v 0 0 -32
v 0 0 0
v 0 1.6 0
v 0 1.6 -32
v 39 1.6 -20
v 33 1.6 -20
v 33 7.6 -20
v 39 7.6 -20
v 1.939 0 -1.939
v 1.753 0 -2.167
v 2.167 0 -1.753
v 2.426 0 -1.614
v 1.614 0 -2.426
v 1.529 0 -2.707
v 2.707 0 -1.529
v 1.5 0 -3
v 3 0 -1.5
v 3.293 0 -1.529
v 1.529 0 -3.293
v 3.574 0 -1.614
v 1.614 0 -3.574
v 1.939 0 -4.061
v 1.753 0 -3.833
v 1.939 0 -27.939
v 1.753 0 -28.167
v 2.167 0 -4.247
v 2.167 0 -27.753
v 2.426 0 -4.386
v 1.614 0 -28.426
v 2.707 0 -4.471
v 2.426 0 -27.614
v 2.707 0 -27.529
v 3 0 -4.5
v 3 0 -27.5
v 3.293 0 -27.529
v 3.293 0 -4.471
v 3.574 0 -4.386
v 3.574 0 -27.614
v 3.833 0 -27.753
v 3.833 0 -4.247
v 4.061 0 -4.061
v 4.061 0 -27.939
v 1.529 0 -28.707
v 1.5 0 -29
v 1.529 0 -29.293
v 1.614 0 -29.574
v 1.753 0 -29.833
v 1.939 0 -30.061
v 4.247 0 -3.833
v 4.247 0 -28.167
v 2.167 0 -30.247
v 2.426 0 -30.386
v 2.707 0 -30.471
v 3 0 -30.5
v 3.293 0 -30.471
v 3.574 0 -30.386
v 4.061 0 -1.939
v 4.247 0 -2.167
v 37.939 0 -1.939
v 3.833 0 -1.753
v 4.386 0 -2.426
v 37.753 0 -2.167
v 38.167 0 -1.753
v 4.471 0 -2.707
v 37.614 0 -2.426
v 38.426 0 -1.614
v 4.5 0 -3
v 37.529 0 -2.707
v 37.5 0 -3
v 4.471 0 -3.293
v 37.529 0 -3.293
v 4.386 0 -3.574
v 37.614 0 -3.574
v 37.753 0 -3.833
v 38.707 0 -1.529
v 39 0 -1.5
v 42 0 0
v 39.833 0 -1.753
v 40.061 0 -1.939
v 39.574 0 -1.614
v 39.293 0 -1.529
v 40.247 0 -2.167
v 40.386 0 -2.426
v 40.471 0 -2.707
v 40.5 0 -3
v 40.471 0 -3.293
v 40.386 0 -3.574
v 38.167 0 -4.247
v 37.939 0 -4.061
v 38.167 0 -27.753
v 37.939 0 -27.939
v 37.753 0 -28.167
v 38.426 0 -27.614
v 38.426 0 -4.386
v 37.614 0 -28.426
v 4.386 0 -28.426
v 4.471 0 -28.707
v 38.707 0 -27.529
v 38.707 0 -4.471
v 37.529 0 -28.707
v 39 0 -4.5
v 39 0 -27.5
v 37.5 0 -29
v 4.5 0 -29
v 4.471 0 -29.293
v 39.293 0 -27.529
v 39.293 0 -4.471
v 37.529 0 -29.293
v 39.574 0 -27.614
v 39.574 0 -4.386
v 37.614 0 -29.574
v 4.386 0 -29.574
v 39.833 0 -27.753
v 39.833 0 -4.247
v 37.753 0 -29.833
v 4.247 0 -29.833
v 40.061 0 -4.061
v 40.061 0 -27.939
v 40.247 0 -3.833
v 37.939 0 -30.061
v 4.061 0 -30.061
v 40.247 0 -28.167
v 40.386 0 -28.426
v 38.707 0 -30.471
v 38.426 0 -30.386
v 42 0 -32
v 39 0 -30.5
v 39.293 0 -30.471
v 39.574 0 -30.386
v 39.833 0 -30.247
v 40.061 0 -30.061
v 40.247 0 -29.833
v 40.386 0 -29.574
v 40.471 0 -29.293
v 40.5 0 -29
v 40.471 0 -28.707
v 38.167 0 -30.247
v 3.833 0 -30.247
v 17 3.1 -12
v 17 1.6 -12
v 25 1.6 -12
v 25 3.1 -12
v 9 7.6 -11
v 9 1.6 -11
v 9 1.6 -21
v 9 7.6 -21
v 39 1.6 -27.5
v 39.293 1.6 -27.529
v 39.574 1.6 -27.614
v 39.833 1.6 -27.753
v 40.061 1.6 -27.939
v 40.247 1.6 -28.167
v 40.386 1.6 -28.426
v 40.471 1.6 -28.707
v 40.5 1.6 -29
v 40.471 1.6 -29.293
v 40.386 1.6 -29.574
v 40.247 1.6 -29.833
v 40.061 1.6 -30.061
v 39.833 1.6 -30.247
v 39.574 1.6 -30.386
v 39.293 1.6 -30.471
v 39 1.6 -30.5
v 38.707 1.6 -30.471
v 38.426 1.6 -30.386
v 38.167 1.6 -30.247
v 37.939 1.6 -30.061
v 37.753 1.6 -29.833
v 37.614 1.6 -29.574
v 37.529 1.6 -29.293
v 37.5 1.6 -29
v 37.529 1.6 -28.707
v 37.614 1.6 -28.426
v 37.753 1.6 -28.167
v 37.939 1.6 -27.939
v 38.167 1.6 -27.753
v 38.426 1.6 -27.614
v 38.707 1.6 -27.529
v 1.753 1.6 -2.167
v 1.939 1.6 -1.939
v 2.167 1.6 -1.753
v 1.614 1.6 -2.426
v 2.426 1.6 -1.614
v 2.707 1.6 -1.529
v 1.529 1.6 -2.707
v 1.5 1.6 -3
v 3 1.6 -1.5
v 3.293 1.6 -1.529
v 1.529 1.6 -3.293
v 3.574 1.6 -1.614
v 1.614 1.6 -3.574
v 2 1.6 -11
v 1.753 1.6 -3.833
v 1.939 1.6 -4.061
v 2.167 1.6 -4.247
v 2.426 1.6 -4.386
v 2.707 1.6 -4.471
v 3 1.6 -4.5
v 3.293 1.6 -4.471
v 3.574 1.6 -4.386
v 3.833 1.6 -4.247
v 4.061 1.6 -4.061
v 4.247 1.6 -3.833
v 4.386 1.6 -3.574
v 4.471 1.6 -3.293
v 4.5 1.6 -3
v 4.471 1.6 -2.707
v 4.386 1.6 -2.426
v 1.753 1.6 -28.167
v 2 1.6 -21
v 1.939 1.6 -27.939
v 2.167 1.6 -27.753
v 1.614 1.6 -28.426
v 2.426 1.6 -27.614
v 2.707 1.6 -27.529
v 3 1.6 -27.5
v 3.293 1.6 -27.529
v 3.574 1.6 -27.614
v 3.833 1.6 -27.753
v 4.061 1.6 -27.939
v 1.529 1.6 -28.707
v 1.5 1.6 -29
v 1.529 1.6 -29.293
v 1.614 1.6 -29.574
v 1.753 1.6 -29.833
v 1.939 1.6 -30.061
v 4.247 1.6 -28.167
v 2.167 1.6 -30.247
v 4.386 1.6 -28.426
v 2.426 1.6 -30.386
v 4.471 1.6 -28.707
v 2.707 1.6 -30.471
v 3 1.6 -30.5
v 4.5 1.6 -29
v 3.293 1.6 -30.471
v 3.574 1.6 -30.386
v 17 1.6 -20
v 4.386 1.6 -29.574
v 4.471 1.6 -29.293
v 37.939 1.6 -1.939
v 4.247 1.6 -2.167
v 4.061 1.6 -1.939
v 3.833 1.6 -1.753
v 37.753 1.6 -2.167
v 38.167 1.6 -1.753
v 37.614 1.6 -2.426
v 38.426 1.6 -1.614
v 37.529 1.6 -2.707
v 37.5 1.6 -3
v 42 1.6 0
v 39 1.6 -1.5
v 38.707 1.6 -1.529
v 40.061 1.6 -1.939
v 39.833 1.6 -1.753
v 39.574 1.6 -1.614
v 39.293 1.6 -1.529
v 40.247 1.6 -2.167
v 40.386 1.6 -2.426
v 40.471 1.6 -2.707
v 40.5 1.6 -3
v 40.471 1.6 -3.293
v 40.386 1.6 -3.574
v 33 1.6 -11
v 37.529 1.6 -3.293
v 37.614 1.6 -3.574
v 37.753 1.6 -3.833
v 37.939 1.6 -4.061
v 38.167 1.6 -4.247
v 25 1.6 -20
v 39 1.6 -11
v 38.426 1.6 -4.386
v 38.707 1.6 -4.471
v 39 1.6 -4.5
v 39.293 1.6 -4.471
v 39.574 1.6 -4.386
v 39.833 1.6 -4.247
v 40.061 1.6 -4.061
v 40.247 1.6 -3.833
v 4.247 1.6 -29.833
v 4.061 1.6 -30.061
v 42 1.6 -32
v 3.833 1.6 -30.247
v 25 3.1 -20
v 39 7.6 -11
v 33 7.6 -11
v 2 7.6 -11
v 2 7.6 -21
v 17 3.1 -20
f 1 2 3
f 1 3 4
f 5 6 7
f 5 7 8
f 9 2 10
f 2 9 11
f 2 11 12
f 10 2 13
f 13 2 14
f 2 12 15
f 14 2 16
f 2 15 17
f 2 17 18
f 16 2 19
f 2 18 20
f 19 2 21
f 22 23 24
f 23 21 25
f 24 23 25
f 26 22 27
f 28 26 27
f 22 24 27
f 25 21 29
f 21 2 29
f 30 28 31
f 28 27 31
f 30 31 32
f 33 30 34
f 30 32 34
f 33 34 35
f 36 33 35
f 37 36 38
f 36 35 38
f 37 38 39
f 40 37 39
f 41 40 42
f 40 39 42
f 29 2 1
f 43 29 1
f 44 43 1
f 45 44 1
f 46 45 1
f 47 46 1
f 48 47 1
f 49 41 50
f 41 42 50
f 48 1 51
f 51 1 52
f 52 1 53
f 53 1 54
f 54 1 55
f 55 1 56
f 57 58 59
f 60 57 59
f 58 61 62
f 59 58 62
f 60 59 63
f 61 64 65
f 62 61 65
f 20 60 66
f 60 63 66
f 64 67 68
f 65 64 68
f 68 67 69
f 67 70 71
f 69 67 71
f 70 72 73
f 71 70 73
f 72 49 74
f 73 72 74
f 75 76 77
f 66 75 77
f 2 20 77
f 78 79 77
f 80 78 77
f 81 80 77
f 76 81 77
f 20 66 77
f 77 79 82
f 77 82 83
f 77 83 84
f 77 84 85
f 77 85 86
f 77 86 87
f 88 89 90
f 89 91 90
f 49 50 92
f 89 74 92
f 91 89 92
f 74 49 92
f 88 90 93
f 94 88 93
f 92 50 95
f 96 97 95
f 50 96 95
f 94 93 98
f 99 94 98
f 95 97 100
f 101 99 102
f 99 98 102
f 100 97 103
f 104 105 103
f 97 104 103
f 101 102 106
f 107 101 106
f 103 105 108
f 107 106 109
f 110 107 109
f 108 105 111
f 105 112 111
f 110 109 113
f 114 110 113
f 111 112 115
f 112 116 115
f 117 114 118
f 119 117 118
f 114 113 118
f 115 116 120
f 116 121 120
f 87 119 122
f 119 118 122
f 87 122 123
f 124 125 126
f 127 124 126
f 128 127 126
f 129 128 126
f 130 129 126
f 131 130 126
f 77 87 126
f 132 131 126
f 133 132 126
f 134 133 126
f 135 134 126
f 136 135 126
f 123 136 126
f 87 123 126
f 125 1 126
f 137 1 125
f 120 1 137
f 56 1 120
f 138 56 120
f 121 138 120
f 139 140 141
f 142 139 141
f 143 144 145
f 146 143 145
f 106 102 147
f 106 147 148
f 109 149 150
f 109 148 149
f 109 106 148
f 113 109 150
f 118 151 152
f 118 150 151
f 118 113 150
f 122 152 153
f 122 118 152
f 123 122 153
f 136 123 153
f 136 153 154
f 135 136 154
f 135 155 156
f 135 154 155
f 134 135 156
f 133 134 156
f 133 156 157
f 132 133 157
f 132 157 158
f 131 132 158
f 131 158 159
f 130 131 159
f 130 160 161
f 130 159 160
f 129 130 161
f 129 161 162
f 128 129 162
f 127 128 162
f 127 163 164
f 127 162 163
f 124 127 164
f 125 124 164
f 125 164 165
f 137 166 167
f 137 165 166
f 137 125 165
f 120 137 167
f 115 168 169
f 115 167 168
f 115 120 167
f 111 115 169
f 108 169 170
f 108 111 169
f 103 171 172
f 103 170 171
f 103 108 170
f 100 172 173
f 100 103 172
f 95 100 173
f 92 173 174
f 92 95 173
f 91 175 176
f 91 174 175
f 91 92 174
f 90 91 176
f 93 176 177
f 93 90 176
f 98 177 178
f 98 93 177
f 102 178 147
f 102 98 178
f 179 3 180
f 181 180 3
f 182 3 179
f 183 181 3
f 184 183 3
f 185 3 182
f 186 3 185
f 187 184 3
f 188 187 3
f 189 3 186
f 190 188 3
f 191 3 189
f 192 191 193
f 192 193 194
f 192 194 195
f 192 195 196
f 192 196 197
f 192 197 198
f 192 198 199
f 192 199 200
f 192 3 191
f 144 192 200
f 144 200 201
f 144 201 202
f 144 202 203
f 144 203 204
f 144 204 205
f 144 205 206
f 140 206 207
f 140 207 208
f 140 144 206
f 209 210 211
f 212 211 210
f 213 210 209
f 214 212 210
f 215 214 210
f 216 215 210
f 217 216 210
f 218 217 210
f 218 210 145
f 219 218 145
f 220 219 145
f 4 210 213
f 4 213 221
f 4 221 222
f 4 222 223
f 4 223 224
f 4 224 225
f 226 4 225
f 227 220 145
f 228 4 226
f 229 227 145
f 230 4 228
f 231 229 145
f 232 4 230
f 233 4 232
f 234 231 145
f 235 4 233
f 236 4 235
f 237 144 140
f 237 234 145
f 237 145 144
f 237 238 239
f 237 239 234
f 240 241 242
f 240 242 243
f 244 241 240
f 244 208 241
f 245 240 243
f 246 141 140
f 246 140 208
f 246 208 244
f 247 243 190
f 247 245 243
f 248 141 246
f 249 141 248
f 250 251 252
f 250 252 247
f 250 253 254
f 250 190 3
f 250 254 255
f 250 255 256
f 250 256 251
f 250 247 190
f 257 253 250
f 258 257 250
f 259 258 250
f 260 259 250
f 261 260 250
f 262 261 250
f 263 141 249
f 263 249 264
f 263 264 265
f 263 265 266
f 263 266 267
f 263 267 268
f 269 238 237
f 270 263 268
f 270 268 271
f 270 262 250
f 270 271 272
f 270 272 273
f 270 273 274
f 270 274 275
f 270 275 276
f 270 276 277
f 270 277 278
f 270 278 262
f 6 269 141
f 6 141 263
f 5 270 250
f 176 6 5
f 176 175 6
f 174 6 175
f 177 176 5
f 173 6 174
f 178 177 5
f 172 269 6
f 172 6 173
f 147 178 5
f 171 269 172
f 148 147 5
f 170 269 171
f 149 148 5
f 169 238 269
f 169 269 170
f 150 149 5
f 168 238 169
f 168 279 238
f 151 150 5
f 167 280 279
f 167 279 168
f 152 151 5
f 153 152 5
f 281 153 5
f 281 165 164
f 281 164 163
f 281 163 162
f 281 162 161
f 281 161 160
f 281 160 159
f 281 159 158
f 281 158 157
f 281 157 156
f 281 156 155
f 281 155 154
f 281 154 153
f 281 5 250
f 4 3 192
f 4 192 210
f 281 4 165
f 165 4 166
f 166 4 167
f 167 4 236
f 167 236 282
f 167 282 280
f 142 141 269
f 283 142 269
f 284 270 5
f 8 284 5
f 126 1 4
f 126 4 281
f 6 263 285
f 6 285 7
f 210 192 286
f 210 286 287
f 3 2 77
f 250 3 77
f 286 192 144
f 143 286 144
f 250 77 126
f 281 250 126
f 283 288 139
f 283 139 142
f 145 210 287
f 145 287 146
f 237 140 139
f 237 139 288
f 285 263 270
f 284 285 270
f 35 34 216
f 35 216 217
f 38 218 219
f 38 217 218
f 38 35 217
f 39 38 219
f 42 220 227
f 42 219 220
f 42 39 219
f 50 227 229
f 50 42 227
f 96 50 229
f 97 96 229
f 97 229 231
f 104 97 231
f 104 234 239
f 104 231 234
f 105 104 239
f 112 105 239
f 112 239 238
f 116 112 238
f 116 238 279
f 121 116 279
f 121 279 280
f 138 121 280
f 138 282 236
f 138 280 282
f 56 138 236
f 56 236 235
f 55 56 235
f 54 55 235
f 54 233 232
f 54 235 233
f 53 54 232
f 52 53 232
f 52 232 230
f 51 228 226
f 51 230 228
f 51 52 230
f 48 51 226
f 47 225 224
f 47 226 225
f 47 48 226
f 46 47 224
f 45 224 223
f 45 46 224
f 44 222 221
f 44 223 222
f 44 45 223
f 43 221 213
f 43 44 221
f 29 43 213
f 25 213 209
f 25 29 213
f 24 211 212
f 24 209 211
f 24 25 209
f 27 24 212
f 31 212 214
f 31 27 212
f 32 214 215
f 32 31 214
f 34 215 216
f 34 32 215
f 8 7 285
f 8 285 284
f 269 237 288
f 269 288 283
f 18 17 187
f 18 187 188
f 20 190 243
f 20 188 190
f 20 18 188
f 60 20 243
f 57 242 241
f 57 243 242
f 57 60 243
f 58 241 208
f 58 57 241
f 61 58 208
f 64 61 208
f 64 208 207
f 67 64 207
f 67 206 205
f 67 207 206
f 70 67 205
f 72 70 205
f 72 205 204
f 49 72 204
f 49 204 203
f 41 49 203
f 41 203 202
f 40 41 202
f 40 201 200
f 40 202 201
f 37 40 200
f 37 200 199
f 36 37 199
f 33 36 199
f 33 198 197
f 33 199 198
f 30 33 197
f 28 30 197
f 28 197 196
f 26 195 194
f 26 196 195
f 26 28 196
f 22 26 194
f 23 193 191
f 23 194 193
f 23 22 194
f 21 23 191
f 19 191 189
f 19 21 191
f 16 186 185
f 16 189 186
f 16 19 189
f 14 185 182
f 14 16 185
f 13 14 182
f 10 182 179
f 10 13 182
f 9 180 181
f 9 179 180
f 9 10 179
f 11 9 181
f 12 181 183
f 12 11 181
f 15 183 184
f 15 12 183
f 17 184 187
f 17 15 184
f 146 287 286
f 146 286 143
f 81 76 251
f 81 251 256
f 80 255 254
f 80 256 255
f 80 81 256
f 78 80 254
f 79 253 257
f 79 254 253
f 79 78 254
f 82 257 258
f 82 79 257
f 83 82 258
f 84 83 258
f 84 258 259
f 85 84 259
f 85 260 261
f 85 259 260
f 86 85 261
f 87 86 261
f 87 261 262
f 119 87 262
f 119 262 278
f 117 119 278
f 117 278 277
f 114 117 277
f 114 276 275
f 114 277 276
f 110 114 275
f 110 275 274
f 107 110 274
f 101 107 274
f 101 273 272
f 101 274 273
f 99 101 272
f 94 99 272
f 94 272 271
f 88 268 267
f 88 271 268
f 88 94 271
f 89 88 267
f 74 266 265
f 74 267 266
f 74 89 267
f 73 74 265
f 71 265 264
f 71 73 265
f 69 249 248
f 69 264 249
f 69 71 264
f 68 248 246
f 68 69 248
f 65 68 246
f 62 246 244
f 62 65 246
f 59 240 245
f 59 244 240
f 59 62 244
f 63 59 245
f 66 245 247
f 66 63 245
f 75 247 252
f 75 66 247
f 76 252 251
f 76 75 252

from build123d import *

# Parameters (mm, degrees)
SKETCH1_W                 = 42
SKETCH1_H                 = 32
PCB_DEPTH                 = 1.6
MOUNT_HOLE_1_DEPTH        = 53.825751296
MOUNT_HOLE_1_DEPTH_BACK   = 53.825751296
SKETCH2_R                 = 1.5
MOUNT_HOLE_2_DEPTH        = 53.825751296
MOUNT_HOLE_2_DEPTH_BACK   = 53.825751296
SKETCH3_R                 = 1.5
MOUNT_HOLE_3_DEPTH        = 53.825751296
MOUNT_HOLE_3_DEPTH_BACK   = 53.825751296
SKETCH4_R                 = 1.5
MOUNT_HOLE_4_DEPTH        = 53.825751296
MOUNT_HOLE_4_DEPTH_BACK   = 53.825751296
SKETCH5_R                 = 1.5
PROBE_CONNECTOR_XH_START  = 1.6
SKETCH6_W                 = 7
SKETCH6_H                 = 10
PROBE_CONNECTOR_XH_DEPTH  = 6
SIGNAL_CONNECTOR_PH_START = 1.6
SKETCH7_W                 = 6
SKETCH7_H                 = 9
SIGNAL_CONNECTOR_PH_DEPTH = 6
SIGNAL_IC_START           = 1.6
SKETCH8_W                 = 8
SKETCH8_H                 = 8
SIGNAL_IC_DEPTH           = 1.5


with BuildPart() as part:
    # Sketch1 → PCB (new body)
    with BuildSketch(Plane(origin=(0, 0, 0), x_dir=(1, 0, 0), z_dir=(0, 1, 0))):
        with Locations((21, 16)):
            Rectangle(SKETCH1_W, SKETCH1_H)
    extrude(amount=PCB_DEPTH)

    # Sketch2 → Mount_hole_1 (cut, two sides: drawn at the far end of the back side and taken through both)
    with BuildSketch(Plane(origin=(0, 0, 0), x_dir=(1, 0, 0), z_dir=(0, 1, 0)).offset(-MOUNT_HOLE_1_DEPTH_BACK)):
        with Locations(Location((3, 3, 0), (0, 0, 270))):
            Circle(SKETCH2_R)
    extrude(amount=MOUNT_HOLE_1_DEPTH + MOUNT_HOLE_1_DEPTH_BACK, mode=Mode.SUBTRACT)

    # Sketch3 → Mount_hole_2 (cut, two sides: drawn at the far end of the back side and taken through both)
    with BuildSketch(Plane(origin=(0, 0, 0), x_dir=(1, 0, 0), z_dir=(0, 1, 0)).offset(-MOUNT_HOLE_2_DEPTH_BACK)):
        with Locations(Location((39, 3, 0), (0, 0, 270))):
            Circle(SKETCH3_R)
    extrude(amount=MOUNT_HOLE_2_DEPTH + MOUNT_HOLE_2_DEPTH_BACK, mode=Mode.SUBTRACT)

    # Sketch4 → Mount_hole_3 (cut, two sides: drawn at the far end of the back side and taken through both)
    with BuildSketch(Plane(origin=(0, 0, 0), x_dir=(1, 0, 0), z_dir=(0, 1, 0)).offset(-MOUNT_HOLE_3_DEPTH_BACK)):
        with Locations(Location((3, 29, 0), (0, 0, 270))):
            Circle(SKETCH4_R)
    extrude(amount=MOUNT_HOLE_3_DEPTH + MOUNT_HOLE_3_DEPTH_BACK, mode=Mode.SUBTRACT)

    # Sketch5 → Mount_hole_4 (cut, two sides: drawn at the far end of the back side and taken through both)
    with BuildSketch(Plane(origin=(0, 0, 0), x_dir=(1, 0, 0), z_dir=(0, 1, 0)).offset(-MOUNT_HOLE_4_DEPTH_BACK)):
        with Locations(Location((39, 29, 0), (0, 0, 270))):
            Circle(SKETCH5_R)
    extrude(amount=MOUNT_HOLE_4_DEPTH + MOUNT_HOLE_4_DEPTH_BACK, mode=Mode.SUBTRACT)

    # Sketch6 → Probe_connector_XH (add)
    with BuildSketch(Plane(origin=(0, 0, 0), x_dir=(1, 0, 0), z_dir=(0, 1, 0)).offset(PROBE_CONNECTOR_XH_START)):
        with Locations((5.5, 16)):
            Rectangle(SKETCH6_W, SKETCH6_H)
    extrude(amount=PROBE_CONNECTOR_XH_DEPTH)

    # Sketch7 → Signal_connector_PH (add)
    with BuildSketch(Plane(origin=(0, 0, 0), x_dir=(1, 0, 0), z_dir=(0, 1, 0)).offset(SIGNAL_CONNECTOR_PH_START)):
        with Locations((36, 15.5)):
            Rectangle(SKETCH7_W, SKETCH7_H)
    extrude(amount=SIGNAL_CONNECTOR_PH_DEPTH)

    # Sketch8 → Signal_IC (add)
    with BuildSketch(Plane(origin=(0, 0, 0), x_dir=(1, 0, 0), z_dir=(0, 1, 0)).offset(SIGNAL_IC_START)):
        with Locations((21, 16)):
            Rectangle(SKETCH8_W, SKETCH8_H)
    extrude(amount=SIGNAL_IC_DEPTH)


solid = part.part
